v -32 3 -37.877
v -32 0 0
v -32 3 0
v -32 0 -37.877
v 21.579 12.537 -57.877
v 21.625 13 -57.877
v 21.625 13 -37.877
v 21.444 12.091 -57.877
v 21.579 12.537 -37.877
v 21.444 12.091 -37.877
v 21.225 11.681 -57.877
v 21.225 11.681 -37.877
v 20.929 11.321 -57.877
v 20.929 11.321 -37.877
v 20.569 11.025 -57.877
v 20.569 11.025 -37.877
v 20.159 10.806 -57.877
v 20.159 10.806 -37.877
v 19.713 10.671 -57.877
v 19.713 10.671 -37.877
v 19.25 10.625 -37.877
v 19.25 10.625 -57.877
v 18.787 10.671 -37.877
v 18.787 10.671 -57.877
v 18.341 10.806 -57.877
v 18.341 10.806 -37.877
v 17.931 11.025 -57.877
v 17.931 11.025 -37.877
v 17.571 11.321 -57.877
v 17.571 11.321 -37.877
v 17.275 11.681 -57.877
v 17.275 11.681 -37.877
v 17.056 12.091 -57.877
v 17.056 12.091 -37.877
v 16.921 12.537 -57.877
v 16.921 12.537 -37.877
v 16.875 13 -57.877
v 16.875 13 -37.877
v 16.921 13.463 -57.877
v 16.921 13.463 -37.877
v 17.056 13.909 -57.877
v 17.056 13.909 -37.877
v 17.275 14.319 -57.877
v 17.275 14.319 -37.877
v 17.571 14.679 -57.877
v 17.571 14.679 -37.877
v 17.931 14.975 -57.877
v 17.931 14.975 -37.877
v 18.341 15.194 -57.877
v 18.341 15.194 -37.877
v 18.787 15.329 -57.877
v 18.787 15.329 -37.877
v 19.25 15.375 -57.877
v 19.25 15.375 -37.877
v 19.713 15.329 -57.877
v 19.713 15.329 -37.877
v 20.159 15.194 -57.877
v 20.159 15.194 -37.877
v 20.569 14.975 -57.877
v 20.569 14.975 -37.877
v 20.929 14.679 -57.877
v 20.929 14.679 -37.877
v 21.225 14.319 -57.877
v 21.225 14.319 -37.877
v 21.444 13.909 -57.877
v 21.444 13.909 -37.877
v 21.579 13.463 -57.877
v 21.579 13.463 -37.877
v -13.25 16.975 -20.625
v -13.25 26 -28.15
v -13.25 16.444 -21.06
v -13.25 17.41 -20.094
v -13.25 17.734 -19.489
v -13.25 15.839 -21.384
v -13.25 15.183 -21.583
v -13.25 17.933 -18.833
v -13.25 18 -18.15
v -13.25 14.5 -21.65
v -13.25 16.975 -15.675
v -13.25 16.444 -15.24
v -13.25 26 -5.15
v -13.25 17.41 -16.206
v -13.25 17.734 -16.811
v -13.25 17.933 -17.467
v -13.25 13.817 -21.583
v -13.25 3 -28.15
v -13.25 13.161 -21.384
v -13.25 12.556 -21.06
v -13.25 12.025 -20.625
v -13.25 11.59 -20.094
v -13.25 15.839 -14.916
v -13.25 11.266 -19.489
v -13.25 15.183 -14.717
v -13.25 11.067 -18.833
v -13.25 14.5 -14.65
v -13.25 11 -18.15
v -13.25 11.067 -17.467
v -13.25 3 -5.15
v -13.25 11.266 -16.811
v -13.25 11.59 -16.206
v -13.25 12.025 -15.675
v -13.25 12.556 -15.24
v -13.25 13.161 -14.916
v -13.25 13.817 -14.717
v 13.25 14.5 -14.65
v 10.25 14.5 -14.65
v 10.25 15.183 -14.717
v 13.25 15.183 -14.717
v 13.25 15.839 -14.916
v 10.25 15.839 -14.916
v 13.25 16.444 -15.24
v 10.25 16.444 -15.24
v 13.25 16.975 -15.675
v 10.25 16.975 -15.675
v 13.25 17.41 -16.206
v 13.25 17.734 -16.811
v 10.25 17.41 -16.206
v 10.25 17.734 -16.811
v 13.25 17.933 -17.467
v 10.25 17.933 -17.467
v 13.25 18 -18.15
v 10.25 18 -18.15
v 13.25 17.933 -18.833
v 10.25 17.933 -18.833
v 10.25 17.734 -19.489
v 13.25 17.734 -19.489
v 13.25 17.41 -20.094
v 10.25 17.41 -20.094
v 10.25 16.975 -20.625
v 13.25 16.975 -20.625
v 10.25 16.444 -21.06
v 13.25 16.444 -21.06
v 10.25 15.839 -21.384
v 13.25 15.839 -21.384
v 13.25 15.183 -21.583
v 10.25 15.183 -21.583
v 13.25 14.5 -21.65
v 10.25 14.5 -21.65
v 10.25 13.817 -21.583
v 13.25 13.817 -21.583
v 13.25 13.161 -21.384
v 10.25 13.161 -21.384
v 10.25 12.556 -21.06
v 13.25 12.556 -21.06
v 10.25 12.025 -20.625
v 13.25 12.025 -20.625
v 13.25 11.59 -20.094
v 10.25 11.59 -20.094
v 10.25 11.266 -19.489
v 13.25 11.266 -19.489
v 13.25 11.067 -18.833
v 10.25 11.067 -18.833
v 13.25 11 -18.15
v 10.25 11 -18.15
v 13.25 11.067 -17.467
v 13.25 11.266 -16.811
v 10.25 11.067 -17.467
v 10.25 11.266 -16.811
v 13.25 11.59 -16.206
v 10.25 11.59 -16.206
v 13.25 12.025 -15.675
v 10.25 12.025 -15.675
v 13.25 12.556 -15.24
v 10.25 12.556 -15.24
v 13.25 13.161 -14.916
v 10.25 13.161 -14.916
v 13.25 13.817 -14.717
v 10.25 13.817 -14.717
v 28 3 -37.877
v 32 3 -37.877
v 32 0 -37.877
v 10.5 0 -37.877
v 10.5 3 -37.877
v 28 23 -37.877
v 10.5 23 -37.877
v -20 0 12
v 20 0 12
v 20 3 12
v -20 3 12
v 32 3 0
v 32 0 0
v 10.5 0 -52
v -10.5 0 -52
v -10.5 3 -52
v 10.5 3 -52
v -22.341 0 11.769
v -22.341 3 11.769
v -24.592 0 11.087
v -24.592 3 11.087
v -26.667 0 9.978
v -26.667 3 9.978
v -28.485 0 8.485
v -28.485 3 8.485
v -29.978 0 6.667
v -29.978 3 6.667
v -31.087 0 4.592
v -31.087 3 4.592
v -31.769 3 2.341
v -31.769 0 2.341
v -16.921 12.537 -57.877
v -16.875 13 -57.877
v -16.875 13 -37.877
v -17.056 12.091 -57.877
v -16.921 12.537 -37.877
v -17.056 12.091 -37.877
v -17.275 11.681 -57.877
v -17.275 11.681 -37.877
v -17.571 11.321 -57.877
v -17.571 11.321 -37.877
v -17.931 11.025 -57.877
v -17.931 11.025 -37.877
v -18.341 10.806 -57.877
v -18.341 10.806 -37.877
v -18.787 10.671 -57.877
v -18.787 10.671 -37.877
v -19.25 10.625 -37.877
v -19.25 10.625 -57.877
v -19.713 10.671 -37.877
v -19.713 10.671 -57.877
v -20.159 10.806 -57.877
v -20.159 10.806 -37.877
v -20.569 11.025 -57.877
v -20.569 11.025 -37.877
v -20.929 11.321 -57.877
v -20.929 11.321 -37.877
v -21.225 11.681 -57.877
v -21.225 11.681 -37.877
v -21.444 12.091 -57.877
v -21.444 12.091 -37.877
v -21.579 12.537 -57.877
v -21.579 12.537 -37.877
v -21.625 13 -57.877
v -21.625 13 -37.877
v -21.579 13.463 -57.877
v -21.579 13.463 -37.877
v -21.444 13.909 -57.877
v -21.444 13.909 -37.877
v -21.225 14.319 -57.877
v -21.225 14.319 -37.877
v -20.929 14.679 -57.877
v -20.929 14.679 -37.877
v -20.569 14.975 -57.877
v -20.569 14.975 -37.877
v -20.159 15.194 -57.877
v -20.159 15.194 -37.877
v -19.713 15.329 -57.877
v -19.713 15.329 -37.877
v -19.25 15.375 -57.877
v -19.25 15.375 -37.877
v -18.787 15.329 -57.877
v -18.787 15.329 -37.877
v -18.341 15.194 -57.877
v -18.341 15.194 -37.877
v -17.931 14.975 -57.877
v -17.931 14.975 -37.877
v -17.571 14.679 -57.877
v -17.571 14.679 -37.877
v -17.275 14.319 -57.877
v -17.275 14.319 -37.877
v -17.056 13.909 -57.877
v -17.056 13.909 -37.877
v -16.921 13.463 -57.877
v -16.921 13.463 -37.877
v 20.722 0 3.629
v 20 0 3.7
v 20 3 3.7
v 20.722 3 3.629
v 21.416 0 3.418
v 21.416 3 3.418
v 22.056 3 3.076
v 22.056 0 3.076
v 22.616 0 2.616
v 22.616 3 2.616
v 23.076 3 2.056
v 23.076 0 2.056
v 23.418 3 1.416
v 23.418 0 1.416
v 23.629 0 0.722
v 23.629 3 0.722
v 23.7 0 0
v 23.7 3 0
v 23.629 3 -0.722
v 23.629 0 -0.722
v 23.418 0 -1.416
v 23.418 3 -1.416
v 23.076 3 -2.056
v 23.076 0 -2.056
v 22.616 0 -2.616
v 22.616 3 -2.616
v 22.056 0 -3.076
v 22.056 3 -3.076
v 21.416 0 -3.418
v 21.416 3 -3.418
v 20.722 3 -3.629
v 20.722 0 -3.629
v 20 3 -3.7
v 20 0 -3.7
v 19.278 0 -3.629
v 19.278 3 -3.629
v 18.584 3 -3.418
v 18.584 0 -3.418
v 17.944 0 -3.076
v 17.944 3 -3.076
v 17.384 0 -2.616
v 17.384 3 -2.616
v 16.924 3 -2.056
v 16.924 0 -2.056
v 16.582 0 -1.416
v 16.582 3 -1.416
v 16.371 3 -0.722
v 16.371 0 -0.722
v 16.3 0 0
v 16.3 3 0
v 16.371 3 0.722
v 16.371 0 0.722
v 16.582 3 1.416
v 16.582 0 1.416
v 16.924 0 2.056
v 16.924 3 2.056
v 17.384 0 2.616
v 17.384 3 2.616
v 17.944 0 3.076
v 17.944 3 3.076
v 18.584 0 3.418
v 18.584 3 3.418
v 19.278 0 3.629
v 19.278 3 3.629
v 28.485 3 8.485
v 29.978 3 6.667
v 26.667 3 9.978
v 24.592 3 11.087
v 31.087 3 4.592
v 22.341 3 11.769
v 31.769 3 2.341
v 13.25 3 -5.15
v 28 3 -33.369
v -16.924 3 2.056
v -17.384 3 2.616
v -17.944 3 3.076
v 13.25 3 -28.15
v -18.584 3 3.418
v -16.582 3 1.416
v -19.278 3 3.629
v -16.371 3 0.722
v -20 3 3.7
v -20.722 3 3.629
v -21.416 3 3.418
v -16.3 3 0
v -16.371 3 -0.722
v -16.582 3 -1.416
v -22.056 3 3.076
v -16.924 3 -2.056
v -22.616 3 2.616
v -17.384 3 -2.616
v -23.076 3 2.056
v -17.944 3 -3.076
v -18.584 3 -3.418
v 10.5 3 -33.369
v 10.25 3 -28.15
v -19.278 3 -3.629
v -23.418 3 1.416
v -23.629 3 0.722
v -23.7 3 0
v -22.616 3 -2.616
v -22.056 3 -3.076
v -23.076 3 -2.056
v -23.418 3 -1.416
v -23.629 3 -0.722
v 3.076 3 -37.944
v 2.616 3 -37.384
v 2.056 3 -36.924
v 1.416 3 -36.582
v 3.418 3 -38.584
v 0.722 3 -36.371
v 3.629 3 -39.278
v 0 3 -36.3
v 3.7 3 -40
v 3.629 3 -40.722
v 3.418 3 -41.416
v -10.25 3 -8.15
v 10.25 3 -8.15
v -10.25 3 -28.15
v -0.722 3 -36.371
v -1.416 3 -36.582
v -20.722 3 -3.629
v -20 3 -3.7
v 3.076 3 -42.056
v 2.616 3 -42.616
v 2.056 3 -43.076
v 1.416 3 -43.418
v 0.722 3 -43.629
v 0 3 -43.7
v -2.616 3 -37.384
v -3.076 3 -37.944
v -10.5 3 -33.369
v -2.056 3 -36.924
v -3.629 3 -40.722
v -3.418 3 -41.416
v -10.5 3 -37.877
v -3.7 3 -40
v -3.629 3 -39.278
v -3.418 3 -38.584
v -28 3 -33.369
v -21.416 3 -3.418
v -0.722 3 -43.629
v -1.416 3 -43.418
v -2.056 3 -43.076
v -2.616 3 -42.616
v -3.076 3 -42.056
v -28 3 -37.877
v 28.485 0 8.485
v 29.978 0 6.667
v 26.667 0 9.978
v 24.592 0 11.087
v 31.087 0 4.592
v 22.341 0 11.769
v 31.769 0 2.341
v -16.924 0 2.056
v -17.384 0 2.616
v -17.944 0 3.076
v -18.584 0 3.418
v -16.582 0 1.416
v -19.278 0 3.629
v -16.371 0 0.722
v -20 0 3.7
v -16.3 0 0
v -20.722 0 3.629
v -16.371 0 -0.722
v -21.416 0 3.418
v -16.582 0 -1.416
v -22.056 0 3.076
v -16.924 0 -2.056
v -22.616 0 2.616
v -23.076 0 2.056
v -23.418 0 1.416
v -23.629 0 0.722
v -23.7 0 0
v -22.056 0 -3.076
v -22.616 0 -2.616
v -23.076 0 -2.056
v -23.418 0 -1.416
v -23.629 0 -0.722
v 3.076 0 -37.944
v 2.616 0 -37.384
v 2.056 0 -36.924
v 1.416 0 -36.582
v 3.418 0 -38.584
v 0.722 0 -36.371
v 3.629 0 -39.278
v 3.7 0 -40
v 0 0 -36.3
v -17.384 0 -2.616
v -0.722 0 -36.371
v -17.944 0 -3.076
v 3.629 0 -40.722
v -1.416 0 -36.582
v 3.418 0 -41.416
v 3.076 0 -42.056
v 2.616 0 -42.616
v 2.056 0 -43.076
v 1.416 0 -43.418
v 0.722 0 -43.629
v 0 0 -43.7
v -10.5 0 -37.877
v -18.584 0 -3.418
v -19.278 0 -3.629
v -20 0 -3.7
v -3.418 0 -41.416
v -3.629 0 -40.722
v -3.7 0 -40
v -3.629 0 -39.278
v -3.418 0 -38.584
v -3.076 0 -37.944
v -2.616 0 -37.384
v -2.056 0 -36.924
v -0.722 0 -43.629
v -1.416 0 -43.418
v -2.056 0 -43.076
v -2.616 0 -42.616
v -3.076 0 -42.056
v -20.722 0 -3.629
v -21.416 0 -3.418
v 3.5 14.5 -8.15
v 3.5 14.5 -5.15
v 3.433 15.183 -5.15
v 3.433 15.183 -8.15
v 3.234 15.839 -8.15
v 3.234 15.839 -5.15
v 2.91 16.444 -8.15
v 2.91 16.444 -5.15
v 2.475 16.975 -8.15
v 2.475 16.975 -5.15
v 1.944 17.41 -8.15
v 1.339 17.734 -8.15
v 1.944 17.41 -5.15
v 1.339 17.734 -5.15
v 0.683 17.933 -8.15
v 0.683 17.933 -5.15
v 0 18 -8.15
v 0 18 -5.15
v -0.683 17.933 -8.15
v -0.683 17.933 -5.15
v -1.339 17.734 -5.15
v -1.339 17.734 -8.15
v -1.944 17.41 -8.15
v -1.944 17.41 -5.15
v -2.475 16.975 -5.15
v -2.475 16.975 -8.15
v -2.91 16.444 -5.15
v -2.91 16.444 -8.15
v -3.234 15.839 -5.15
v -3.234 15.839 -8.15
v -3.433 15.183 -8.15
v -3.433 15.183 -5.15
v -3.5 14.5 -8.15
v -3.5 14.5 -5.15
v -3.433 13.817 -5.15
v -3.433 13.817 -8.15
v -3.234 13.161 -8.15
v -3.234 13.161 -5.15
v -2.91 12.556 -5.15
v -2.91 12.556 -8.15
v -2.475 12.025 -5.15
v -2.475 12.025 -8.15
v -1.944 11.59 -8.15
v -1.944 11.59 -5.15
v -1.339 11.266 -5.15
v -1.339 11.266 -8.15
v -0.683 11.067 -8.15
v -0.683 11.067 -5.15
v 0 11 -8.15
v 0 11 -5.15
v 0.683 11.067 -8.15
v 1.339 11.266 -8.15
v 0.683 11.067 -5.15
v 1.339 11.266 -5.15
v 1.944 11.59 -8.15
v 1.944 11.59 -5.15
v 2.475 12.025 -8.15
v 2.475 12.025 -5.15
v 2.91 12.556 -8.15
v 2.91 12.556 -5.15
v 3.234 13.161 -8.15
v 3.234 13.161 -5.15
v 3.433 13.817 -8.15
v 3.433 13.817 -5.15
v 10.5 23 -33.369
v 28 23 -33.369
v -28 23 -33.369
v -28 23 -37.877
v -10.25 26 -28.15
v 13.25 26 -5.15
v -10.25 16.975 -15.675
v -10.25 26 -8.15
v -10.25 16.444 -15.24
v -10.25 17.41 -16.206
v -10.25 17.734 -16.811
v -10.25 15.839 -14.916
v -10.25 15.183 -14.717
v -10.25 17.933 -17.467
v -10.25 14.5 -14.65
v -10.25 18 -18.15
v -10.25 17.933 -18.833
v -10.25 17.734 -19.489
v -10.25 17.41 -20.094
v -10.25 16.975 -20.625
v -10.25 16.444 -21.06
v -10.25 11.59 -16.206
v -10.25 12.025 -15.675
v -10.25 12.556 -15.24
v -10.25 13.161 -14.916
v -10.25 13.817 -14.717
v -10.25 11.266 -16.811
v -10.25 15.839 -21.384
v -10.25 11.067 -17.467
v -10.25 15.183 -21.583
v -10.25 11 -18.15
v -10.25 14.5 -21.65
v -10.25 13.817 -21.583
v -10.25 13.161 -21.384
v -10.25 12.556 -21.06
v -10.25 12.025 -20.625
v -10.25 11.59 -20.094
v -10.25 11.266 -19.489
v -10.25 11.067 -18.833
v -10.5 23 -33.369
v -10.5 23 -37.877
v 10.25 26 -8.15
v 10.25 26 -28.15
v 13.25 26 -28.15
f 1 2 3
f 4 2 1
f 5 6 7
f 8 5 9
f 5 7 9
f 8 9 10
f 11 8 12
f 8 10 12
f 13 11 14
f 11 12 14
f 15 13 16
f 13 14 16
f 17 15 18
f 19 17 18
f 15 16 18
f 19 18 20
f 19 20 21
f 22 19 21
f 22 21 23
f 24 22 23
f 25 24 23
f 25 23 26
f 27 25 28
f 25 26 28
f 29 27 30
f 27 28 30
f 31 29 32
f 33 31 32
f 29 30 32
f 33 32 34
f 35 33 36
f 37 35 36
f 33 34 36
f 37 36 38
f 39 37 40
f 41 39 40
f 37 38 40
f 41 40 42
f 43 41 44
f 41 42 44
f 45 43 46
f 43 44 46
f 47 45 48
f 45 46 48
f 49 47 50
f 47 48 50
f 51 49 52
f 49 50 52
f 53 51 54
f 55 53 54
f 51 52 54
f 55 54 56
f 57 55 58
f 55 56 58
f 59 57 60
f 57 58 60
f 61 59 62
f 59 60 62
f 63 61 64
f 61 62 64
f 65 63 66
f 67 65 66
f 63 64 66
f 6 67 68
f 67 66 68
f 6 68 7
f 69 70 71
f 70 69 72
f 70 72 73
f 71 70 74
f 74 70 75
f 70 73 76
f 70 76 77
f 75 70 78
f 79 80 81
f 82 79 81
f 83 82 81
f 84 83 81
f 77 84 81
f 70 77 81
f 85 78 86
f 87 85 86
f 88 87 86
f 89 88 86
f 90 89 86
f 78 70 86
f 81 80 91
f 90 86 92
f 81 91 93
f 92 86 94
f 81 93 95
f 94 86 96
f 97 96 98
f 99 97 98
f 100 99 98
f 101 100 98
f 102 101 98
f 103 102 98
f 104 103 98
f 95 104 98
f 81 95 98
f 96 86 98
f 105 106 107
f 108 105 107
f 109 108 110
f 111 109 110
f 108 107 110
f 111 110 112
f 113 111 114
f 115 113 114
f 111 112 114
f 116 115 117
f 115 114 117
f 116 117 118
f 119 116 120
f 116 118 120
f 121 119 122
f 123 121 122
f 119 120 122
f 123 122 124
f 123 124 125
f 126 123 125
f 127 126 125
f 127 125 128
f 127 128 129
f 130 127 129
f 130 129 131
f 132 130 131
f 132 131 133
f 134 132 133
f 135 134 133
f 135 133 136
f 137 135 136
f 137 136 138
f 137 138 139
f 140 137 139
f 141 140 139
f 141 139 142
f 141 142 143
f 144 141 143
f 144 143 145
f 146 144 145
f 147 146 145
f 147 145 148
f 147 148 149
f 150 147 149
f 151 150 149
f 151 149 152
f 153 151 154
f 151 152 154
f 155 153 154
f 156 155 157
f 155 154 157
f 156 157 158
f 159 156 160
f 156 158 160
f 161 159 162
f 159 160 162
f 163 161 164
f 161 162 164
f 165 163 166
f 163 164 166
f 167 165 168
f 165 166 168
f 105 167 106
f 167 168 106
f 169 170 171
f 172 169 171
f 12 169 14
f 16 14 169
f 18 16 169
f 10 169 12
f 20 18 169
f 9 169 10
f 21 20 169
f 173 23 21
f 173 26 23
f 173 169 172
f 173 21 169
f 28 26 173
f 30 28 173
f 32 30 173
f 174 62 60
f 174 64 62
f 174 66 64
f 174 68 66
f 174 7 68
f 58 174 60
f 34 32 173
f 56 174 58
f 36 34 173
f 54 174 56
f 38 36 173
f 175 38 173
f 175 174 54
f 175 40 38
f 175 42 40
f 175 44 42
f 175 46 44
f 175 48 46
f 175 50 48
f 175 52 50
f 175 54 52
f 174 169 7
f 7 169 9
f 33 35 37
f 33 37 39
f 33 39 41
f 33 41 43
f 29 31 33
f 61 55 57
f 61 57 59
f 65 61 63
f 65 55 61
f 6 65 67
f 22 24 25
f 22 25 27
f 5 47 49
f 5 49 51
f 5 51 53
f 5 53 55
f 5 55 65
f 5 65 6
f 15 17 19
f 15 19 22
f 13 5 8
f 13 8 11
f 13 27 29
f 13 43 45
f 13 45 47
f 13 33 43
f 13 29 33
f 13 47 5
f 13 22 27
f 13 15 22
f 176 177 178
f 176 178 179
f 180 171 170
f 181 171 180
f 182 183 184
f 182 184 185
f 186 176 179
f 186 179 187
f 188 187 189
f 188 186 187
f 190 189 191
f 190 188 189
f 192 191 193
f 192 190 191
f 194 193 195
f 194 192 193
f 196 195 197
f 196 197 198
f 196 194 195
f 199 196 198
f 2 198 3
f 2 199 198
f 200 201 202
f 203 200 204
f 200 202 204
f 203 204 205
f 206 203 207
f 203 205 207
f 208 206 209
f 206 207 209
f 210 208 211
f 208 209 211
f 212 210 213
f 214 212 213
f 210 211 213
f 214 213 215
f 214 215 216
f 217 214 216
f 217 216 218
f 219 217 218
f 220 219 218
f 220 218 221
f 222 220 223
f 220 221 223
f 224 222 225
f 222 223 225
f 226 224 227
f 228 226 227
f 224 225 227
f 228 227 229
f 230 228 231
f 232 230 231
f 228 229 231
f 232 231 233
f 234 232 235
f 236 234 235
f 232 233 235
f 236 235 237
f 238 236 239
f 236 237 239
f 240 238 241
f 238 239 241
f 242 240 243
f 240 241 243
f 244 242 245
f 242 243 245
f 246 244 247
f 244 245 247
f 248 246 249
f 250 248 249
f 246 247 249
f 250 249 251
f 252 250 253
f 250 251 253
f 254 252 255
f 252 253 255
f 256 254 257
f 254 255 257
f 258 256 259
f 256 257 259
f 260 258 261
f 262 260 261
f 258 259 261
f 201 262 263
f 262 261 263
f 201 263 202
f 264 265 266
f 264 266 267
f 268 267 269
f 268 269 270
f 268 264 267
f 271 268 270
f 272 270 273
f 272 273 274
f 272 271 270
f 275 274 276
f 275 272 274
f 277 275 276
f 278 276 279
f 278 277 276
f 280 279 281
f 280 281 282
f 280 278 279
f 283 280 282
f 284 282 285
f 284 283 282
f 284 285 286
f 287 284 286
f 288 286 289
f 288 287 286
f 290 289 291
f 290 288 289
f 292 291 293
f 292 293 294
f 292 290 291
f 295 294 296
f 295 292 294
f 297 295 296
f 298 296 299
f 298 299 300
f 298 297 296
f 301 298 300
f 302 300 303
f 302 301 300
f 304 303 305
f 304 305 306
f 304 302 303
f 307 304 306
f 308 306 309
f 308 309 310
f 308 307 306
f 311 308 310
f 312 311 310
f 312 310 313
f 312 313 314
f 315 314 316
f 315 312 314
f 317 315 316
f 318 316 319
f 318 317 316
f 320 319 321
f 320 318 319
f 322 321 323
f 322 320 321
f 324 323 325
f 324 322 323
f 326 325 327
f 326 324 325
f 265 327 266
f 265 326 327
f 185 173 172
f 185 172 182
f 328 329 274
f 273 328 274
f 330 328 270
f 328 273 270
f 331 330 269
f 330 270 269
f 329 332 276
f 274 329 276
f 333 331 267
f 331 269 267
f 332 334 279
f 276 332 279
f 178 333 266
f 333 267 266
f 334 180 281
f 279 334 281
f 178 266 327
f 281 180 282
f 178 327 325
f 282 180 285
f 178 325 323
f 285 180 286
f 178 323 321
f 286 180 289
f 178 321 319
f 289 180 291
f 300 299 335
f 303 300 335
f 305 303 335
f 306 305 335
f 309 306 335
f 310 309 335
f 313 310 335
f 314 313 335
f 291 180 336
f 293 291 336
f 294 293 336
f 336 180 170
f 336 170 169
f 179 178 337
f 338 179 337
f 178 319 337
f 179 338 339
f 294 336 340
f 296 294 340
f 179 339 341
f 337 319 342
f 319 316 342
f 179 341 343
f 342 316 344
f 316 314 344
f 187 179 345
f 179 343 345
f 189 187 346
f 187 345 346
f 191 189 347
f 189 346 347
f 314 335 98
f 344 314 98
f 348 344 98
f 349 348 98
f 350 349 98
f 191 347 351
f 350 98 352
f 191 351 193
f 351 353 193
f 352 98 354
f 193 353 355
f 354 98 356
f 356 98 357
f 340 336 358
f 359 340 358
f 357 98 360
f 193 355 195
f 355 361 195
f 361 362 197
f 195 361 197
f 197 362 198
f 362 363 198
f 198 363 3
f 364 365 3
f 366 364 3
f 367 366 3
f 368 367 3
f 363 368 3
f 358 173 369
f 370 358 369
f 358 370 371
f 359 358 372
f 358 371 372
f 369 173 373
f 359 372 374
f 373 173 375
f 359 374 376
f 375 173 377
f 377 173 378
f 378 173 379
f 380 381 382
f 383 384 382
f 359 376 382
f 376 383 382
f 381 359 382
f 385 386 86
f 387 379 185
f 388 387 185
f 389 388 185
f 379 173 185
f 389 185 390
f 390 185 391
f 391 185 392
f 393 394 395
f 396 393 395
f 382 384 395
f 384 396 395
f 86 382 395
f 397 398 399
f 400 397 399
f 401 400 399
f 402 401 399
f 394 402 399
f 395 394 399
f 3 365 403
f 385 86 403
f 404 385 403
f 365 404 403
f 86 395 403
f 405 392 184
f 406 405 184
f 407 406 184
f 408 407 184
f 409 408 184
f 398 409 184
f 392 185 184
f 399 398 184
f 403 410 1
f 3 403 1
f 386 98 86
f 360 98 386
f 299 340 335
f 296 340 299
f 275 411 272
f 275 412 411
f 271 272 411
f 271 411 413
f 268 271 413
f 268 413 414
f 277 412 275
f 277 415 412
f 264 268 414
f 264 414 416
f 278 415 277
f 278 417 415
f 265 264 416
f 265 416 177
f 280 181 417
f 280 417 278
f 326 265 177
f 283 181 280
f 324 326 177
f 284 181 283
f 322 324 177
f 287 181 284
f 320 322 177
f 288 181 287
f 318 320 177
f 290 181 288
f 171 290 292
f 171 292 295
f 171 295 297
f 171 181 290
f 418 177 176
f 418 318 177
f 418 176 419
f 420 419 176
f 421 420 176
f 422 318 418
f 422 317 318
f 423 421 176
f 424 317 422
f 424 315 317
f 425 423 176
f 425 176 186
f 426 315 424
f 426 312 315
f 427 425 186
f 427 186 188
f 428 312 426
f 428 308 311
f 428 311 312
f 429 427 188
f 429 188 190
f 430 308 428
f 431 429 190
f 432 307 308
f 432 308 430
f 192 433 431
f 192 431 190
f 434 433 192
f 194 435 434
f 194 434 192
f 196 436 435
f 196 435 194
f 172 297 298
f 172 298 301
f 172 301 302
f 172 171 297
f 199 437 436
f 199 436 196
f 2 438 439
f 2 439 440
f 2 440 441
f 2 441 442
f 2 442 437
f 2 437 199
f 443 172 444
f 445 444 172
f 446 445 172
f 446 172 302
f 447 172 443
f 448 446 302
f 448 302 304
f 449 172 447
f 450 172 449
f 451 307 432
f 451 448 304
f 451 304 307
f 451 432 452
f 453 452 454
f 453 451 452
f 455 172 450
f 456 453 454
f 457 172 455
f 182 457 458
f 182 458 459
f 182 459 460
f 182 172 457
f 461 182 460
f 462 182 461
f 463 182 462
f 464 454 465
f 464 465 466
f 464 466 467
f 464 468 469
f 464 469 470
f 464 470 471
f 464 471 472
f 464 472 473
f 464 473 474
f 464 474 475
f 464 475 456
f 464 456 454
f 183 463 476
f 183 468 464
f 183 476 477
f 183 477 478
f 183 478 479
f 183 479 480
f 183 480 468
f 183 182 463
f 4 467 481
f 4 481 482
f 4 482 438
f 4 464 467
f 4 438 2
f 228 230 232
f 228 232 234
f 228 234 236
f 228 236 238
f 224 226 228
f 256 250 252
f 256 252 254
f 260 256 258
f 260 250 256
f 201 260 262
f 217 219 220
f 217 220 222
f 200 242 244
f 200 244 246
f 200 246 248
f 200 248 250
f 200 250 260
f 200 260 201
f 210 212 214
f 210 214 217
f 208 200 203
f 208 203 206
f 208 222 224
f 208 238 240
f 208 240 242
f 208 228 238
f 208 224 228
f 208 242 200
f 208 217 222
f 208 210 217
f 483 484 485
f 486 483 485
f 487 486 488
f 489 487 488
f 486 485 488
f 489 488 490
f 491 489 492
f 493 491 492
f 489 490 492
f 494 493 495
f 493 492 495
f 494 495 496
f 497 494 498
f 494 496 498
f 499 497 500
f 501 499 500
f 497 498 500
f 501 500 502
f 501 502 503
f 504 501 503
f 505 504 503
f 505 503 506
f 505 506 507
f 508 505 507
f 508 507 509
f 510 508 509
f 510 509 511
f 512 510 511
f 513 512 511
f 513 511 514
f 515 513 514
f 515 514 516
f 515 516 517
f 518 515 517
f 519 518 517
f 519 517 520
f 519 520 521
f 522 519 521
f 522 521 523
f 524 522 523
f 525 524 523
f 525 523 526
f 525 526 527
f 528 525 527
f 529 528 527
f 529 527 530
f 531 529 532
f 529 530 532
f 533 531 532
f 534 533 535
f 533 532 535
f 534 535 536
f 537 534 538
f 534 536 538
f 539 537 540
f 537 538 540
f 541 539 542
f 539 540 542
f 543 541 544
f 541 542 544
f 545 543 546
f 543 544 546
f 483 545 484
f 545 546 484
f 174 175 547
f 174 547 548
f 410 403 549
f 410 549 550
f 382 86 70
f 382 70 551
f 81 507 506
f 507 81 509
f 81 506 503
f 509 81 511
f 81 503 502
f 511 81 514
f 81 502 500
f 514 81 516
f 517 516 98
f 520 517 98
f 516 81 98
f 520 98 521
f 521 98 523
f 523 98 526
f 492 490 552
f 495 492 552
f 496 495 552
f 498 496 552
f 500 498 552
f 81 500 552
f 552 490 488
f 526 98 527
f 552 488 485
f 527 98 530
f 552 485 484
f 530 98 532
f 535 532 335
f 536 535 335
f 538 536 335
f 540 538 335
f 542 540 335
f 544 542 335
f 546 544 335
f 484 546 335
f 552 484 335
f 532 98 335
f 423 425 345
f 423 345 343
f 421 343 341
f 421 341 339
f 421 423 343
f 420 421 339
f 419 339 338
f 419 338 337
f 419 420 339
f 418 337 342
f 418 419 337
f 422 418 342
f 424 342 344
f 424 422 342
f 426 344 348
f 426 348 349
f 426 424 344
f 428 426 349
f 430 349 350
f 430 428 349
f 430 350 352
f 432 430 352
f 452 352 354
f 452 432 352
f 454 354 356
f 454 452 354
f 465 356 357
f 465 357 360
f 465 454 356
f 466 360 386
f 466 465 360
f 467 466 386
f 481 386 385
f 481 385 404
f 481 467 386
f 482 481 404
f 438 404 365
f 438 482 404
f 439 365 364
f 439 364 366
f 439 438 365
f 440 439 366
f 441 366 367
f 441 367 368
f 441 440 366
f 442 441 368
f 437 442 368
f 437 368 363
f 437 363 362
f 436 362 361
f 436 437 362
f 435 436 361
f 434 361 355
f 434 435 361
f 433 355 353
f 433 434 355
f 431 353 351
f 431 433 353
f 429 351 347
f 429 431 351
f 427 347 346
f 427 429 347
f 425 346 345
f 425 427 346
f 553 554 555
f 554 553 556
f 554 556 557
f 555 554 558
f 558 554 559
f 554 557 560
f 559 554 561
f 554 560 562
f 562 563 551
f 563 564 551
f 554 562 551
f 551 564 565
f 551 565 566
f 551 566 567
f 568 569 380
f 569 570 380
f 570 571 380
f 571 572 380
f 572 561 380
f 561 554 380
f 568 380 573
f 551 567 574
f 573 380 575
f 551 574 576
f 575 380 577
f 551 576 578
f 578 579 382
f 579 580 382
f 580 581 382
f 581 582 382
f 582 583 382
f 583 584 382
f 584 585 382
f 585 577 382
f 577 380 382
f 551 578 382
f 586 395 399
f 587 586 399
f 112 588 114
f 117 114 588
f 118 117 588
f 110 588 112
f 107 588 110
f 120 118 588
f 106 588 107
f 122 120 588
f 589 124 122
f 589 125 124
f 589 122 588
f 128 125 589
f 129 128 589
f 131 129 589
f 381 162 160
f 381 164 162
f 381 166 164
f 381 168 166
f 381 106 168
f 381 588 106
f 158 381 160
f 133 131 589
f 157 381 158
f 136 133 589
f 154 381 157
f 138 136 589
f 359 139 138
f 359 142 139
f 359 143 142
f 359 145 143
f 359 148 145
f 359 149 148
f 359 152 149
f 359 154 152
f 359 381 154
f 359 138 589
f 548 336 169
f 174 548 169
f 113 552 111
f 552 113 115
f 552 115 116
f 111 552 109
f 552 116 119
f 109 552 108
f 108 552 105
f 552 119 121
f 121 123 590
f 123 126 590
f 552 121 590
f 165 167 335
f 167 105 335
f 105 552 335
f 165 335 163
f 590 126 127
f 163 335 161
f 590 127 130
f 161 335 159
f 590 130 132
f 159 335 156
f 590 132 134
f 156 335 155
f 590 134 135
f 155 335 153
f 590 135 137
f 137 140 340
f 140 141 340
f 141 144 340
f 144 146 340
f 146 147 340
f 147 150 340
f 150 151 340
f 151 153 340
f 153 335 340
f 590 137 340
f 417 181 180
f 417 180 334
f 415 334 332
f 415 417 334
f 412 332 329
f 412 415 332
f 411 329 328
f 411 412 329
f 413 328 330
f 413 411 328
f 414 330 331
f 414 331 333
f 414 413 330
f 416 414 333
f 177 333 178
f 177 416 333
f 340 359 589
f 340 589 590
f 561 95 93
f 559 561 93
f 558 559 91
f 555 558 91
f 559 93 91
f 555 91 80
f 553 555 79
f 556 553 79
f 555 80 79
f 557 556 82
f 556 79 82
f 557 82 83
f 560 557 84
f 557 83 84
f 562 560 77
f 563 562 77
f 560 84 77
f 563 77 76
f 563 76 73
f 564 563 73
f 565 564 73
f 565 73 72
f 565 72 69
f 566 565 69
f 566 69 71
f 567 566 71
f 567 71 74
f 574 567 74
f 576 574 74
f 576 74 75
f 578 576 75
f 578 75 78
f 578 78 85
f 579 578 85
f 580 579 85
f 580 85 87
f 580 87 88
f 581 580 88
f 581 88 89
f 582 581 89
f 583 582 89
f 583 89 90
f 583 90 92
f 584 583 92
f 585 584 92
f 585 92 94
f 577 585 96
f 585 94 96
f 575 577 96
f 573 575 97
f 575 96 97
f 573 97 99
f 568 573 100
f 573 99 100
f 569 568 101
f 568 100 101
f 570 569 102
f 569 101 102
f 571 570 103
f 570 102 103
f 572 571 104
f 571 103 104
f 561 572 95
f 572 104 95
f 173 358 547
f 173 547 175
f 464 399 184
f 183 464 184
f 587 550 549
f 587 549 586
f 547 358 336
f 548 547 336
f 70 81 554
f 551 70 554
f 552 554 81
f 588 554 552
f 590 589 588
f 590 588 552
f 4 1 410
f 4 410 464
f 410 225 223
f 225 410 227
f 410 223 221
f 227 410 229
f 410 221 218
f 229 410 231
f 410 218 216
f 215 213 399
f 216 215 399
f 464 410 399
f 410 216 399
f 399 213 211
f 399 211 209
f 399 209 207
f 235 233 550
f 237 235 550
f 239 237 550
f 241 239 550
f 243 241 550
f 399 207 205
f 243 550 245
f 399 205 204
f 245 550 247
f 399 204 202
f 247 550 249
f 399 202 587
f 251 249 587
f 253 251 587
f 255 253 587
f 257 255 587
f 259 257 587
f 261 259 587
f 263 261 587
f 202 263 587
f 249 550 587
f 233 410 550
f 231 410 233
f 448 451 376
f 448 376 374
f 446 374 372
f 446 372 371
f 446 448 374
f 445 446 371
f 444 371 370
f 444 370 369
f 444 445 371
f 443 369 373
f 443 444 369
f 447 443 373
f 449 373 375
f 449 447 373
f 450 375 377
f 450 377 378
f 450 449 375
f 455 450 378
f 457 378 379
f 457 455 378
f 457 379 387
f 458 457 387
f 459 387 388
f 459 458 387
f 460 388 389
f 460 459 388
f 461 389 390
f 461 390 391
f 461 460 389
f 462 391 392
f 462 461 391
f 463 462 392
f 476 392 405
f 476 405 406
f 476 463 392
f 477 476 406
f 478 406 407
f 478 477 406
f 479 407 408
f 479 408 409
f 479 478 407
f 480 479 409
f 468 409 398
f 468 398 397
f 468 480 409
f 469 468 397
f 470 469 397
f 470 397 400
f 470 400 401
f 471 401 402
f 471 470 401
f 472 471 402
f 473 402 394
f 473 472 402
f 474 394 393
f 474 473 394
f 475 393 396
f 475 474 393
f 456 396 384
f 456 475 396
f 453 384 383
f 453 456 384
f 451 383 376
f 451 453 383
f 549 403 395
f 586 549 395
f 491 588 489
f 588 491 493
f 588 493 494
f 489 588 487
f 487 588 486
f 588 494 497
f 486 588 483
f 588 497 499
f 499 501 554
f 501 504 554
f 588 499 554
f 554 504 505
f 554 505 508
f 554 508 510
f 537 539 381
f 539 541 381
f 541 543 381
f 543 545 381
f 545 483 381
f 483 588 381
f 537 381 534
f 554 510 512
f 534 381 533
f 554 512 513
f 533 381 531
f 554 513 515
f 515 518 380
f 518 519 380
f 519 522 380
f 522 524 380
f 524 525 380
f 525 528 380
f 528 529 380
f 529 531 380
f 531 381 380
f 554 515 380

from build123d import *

# Parameters (mm, degrees)
SKETCH1_R           = 3.7
BOSS_EXTRUDE1_DEPTH = 3
SKETCH2_W           = 17.5
SKETCH2_H           = 4.507827608
BOSS_EXTRUDE2_DEPTH = 20
SKETCH3_R           = 2.375
BOSS_EXTRUDE3_DEPTH = 20
CUT_EXTRUDE1_REACH  = 71.092
SKETCH6_W           = 3
SKETCH6_H           = 20
BOSS_EXTRUDE4_DEPTH = 23
CUT_EXTRUDE2_REACH  = 79.931
SKETCH7_R           = 3.5
CUT_EXTRUDE3_REACH  = 68.934
SKETCH8_R           = 3.5


with BuildPart() as part:
    # Sketch1 → Boss-Extrude1 (new body)
    with BuildSketch(Plane(origin=(0, 0, 0), x_dir=(1, 0, 0), z_dir=(0, 1, 0))):
        with BuildLine():
            Line((-32, 0), (-32, 40))
            ThreePointArc((-32, 40), (-28.485281374, 48.485281374), (-20, 52))
            Line((-20, 52), (20, 52))
            ThreePointArc((20, 52), (28.485281374, 48.485281374), (32, 40))
            Line((32, 40), (32, 0))
            ThreePointArc((32, 0), (28.485281374, -8.485281374), (20, -12))
            Line((20, -12), (-20, -12))
            ThreePointArc((-20, -12), (-28.485281374, -8.485281374), (-32, 0))
        make_face()
        with Locations(Location((20, 0, 0), (0, 0, 270))):
            Circle(SKETCH1_R, mode=Mode.SUBTRACT)
        with Locations(Location((-20, 0, 0), (0, 0, 270))):
            Circle(SKETCH1_R, mode=Mode.SUBTRACT)
        with Locations(Location((0, 40, 0), (0, 0, 270))):
            Circle(SKETCH1_R, mode=Mode.SUBTRACT)
    extrude(amount=BOSS_EXTRUDE1_DEPTH)

    # Sketch2 → Boss-Extrude2 (add)
    with BuildSketch(Plane(origin=(0, 3, 0), x_dir=(1, 0, 0), z_dir=(0, 1, 0))):
        with Locations((19.25, 35.622787036)):
            Rectangle(SKETCH2_W, SKETCH2_H)
        with Locations((-19.25, 35.622787036)):
            Rectangle(SKETCH2_W, SKETCH2_H)
    extrude(amount=BOSS_EXTRUDE2_DEPTH)

    # Sketch3 → Boss-Extrude3 (add)
    with BuildSketch(Plane(origin=(0, 0, -37.87670084), x_dir=(-1, 0, 0), z_dir=(0, 0, -1))):
        with Locations(Location((-19.25, 13, 0), (0, 0, 180))):
            Circle(SKETCH3_R)
        with Locations(Location((19.25, 13, 0), (0, 0, 180))):
            Circle(SKETCH3_R)
    extrude(amount=BOSS_EXTRUDE3_DEPTH)

    # Sketch5 → Cut-Extrude1 (cut, up to next)
    with BuildSketch(Plane(origin=(0, 3, 0), x_dir=(1, 0, 0), z_dir=(0, 1, 0)), mode=Mode.PRIVATE) as cut_extrude1_sk1:
        with BuildLine():
            Line((-32, 37.87670084), (-10.5, 37.87670084))
            Line((-10.5, 37.87670084), (-10.5, 52))
            Line((-10.5, 52), (-20, 52))
            ThreePointArc((-20, 52), (-28.485281374, 48.485281374), (-32, 40))
            Line((-32, 40), (-32, 37.87670084))
        make_face()
    cut_extrude1_tool1 = extrude(cut_extrude1_sk1.sketch, amount=-CUT_EXTRUDE1_REACH, mode=Mode.PRIVATE) & part.part
    # Sketch5 → Cut-Extrude1 (cut, up to next)
    with BuildSketch(Plane(origin=(0, 3, 0), x_dir=(1, 0, 0), z_dir=(0, 1, 0)), mode=Mode.PRIVATE) as cut_extrude1_sk2:
        with BuildLine():
            Line((32, 37.87670084), (10.5, 37.87670084))
            Line((10.5, 37.87670084), (10.5, 52))
            Line((10.5, 52), (20, 52))
            ThreePointArc((20, 52), (28.485281374, 48.485281374), (32, 40))
            Line((32, 40), (32, 37.87670084))
        make_face()
    cut_extrude1_tool2 = extrude(cut_extrude1_sk2.sketch, amount=-CUT_EXTRUDE1_REACH, mode=Mode.PRIVATE) & part.part
    add(cut_extrude1_tool1.solids().sort_by_distance((-20.335708, 3, -44.441952))[0], mode=Mode.SUBTRACT)
    add(cut_extrude1_tool2.solids().sort_by_distance((20.335708, 3, -44.441952))[0], mode=Mode.SUBTRACT)

    # Sketch6 → Boss-Extrude4 (add)
    with BuildSketch(Plane(origin=(0, 3, 0), x_dir=(1, 0, 0), z_dir=(0, 1, 0))):
        with Locations((-11.75, 18.15)):
            Rectangle(SKETCH6_W, SKETCH6_H)
        Polygon((13.25, 8.15), (10.25, 8.15), (-10.25, 8.15), (-13.25, 8.15), (-13.25, 5.15), (13.25, 5.15), align=None)
        with Locations((11.75, 18.15)):
            Rectangle(SKETCH6_W, SKETCH6_H)
    extrude(amount=BOSS_EXTRUDE4_DEPTH)

    # Cut-Extrude2: up to this face of the body (flat: up to its plane)
    cut_extrude2_end = Plane(part.part.faces().sort_by_distance((13.25, 14.5, -16.65))[0])
    # Sketch7 → Cut-Extrude2 (cut, up to the picked face)
    with BuildSketch(Plane.ZY.offset(13.25), mode=Mode.PRIVATE) as cut_extrude2_sk1:
        with Locations((-18.15, 14.5)):
            Circle(SKETCH7_R)
    cut_extrude2_tool1 = split(extrude(cut_extrude2_sk1.sketch, amount=-CUT_EXTRUDE2_REACH, mode=Mode.PRIVATE), bisect_by=cut_extrude2_end, keep=Keep.BOTH, mode=Mode.PRIVATE)
    add(cut_extrude2_tool1.solids().sort_by(Axis((-13.25, 14.5, -18.15), (1, 0, 0)))[0], mode=Mode.SUBTRACT)

    # Sketch8 → Cut-Extrude3 (cut, up to next)
    with BuildSketch(Plane.XY.offset(-5.15), mode=Mode.PRIVATE) as cut_extrude3_sk1:
        with Locations((0, 14.5)):
            Circle(SKETCH8_R)
    cut_extrude3_tool1 = extrude(cut_extrude3_sk1.sketch, amount=-CUT_EXTRUDE3_REACH, mode=Mode.PRIVATE) & part.part
    add(cut_extrude3_tool1.solids().sort_by_distance((0, 14.5, -5.15))[0], mode=Mode.SUBTRACT)


solid = part.part
